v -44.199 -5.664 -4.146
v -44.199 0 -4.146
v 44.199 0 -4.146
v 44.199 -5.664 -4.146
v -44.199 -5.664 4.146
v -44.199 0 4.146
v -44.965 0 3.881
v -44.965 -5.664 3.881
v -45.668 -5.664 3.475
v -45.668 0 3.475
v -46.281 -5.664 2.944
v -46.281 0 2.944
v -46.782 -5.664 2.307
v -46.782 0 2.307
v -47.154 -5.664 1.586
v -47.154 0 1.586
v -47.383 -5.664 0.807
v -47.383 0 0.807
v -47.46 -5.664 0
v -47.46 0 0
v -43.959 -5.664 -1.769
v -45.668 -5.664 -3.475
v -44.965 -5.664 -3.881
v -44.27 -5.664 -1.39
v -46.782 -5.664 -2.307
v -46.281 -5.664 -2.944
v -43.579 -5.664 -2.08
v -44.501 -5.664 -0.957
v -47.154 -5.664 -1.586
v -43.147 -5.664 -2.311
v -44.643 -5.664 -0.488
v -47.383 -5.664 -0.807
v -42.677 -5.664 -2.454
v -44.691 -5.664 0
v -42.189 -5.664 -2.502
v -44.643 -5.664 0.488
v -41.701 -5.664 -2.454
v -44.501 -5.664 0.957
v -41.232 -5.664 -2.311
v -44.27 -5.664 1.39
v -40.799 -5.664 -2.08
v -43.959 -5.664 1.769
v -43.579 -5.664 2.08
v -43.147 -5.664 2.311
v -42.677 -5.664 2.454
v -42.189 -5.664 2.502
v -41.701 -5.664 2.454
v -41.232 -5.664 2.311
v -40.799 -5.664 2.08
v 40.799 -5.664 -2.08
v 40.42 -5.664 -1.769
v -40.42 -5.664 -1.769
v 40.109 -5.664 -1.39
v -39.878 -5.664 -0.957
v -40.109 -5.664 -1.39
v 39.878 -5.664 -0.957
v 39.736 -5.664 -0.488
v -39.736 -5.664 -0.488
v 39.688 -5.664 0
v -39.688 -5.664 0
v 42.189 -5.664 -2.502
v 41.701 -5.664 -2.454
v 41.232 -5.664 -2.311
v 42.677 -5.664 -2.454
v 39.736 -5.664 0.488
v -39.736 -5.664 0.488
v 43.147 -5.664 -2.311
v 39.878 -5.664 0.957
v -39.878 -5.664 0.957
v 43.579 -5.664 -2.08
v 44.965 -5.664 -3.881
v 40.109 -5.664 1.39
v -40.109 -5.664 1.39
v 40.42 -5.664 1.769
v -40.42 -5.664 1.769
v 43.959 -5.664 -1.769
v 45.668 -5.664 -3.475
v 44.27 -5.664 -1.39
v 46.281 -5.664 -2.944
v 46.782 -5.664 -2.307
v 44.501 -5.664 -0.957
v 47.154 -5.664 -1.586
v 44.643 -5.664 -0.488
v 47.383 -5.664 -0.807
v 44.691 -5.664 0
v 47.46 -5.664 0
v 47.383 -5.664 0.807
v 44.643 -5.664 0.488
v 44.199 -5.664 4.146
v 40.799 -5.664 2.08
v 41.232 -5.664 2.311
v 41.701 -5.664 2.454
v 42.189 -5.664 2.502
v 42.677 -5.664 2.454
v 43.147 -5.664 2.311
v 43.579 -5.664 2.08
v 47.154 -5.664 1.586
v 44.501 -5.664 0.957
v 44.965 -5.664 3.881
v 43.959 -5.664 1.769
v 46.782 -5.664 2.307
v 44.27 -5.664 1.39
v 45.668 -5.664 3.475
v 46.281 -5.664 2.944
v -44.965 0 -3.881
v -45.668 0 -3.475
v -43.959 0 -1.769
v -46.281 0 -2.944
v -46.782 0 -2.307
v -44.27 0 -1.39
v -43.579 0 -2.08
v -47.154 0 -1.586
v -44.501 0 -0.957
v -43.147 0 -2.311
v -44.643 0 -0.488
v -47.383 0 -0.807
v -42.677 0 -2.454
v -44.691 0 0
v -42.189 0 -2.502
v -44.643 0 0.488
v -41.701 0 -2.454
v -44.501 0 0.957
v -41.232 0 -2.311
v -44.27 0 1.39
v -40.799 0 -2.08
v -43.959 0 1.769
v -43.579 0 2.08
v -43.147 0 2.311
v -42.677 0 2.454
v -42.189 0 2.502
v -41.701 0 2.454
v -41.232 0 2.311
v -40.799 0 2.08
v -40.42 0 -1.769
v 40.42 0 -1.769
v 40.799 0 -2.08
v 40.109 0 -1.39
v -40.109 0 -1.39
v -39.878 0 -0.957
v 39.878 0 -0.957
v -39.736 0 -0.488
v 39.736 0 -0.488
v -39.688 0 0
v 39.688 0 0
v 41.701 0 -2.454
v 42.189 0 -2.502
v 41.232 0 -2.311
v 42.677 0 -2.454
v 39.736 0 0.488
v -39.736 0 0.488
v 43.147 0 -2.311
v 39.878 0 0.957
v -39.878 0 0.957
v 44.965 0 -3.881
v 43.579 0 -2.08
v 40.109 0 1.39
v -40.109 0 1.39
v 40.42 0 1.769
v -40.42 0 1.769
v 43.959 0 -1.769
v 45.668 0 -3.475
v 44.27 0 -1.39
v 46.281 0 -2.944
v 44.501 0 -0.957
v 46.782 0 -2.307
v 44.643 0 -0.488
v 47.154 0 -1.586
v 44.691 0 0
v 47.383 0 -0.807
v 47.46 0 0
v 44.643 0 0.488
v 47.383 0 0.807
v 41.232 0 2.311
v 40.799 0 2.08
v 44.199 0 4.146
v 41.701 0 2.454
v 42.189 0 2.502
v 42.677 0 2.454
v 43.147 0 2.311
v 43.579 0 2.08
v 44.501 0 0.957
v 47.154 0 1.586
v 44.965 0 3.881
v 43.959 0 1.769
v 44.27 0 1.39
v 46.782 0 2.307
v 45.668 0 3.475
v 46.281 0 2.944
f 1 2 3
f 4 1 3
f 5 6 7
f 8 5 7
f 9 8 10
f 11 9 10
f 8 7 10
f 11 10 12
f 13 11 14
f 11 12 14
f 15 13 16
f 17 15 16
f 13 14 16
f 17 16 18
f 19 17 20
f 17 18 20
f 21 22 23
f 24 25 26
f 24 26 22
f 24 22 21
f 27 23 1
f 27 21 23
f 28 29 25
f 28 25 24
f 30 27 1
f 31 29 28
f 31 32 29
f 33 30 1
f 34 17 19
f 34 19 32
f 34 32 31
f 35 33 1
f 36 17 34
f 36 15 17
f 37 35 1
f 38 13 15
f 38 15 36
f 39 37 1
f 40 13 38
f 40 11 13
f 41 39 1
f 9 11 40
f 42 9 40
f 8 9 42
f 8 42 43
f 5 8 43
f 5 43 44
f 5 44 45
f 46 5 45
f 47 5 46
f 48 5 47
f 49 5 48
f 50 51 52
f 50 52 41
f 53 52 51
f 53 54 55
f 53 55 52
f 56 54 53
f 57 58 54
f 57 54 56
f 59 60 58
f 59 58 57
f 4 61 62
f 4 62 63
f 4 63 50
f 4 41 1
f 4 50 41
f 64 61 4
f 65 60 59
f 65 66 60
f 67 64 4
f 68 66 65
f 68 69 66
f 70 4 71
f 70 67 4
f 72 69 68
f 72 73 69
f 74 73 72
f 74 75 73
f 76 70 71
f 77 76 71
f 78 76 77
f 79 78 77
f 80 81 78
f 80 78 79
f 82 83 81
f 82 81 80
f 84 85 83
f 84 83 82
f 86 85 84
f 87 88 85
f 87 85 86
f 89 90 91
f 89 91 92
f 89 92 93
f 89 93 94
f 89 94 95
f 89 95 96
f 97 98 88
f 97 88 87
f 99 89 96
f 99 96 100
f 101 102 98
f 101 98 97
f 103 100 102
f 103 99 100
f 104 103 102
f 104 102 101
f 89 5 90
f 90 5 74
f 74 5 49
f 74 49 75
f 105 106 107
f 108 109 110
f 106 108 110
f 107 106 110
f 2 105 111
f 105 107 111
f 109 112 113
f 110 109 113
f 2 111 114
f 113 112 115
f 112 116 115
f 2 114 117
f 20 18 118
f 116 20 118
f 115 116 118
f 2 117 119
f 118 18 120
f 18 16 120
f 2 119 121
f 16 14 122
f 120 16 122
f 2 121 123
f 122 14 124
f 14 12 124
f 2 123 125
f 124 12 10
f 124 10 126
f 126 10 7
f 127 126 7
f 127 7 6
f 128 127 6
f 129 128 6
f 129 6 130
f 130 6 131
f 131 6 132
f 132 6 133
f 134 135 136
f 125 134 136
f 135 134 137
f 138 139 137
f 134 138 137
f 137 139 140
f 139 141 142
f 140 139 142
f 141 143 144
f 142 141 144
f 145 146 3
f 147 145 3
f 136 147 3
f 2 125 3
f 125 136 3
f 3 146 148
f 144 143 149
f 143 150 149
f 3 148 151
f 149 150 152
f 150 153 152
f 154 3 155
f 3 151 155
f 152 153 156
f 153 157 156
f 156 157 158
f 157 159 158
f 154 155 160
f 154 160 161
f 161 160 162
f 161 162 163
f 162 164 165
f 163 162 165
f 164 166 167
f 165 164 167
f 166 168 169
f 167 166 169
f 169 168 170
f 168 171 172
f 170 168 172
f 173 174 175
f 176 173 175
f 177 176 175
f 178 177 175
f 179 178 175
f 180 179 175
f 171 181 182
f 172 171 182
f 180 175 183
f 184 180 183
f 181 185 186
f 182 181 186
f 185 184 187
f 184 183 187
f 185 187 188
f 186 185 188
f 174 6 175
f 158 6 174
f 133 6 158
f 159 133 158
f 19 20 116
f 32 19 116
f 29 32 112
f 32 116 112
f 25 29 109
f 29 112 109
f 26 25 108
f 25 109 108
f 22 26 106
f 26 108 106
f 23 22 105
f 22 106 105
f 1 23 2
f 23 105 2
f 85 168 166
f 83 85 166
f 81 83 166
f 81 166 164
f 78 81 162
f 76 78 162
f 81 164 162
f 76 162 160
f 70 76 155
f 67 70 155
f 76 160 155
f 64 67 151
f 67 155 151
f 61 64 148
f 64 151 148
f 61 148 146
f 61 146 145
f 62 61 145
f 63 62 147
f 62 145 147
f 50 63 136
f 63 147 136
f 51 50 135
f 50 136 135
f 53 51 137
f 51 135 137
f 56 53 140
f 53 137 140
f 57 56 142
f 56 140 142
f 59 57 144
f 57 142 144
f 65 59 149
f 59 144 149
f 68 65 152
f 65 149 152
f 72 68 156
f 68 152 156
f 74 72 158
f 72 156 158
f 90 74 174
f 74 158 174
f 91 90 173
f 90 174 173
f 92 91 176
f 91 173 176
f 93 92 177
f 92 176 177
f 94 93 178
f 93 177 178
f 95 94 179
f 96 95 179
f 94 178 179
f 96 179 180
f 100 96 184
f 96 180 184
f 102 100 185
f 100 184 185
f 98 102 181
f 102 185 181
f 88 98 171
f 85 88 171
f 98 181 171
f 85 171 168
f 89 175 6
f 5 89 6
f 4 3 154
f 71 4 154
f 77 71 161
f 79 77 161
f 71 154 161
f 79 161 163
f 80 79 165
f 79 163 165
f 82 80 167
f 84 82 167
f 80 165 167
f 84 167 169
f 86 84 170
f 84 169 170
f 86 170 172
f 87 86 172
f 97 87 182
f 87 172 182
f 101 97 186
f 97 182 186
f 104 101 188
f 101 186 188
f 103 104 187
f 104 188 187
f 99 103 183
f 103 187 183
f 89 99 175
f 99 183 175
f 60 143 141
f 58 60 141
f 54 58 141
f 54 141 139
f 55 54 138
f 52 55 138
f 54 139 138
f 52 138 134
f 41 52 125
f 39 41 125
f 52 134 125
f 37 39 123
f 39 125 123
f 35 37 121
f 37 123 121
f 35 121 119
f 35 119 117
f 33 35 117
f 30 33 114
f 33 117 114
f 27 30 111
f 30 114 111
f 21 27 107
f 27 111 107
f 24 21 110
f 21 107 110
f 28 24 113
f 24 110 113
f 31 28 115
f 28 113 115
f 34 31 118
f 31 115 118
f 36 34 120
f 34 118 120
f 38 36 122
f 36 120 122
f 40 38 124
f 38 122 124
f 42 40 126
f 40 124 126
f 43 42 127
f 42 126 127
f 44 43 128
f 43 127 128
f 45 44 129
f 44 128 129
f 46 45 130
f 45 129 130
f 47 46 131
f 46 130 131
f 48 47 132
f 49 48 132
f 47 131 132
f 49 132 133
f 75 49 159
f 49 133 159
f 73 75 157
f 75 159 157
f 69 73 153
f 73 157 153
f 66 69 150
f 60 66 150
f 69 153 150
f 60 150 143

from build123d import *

# Parameters (mm, degrees)
F1_DEPTH = 5.6642


with BuildPart() as f1:
    # F0 (on Front) → F1 (new body)
    with BuildSketch(Plane.XZ):
        with BuildLine():
            Line((-39.6875, 0), (0, 0))
            Line((0, 0), (0, 4.145858))
            Line((0, 4.145858), (-42.1894, 4.145858))
            Line((-42.1894, 4.145858), (-44.198703, 4.145858))
            ThreePointArc((-44.198703, 4.145858), (-46.546897, 2.637402), (-47.4599, 0))
            Line((-47.4599, 0), (-44.6913, 0))
            ThreePointArc((-44.6913, 0), (-42.1894, 2.5019), (-39.6875, 0))
        make_face()
        with BuildLine():
            Line((0, -4.145858), (0, 0))
            Line((0, 0), (-39.6875, 0))
            ThreePointArc((-39.6875, 0), (-42.1894, -2.5019), (-44.6913, 0))
            Line((-44.6913, 0), (-47.4599, 0))
            ThreePointArc((-47.4599, 0), (-46.546897, -2.637402), (-44.198703, -4.145858))
            Line((-44.198703, -4.145858), (-42.1894, -4.145858))
            Line((-42.1894, -4.145858), (0, -4.145858))
        make_face()
        with BuildLine():
            ThreePointArc((39.6875, 0), (42.1894, 2.5019), (44.6913, 0))
            Line((44.6913, 0), (47.4599, 0))
            ThreePointArc((47.4599, 0), (46.546897, 2.637402), (44.198703, 4.145858))
            Line((44.198703, 4.145858), (42.1894, 4.145858))
            Line((42.1894, 4.145858), (0, 4.145858))
            Line((0, 4.145858), (0, 0))
            Line((0, 0), (39.6875, 0))
        make_face()
        with BuildLine():
            Line((47.4599, 0), (44.6913, 0))
            ThreePointArc((44.6913, 0), (42.1894, -2.5019), (39.6875, 0))
            Line((39.6875, 0), (0, 0))
            Line((0, 0), (0, -4.145858))
            Line((0, -4.145858), (42.1894, -4.145858))
            Line((42.1894, -4.145858), (44.198703, -4.145858))
            ThreePointArc((44.198703, -4.145858), (46.546897, -2.637402), (47.4599, 0))
        make_face()
    extrude(amount=F1_DEPTH)


solid = f1.part
